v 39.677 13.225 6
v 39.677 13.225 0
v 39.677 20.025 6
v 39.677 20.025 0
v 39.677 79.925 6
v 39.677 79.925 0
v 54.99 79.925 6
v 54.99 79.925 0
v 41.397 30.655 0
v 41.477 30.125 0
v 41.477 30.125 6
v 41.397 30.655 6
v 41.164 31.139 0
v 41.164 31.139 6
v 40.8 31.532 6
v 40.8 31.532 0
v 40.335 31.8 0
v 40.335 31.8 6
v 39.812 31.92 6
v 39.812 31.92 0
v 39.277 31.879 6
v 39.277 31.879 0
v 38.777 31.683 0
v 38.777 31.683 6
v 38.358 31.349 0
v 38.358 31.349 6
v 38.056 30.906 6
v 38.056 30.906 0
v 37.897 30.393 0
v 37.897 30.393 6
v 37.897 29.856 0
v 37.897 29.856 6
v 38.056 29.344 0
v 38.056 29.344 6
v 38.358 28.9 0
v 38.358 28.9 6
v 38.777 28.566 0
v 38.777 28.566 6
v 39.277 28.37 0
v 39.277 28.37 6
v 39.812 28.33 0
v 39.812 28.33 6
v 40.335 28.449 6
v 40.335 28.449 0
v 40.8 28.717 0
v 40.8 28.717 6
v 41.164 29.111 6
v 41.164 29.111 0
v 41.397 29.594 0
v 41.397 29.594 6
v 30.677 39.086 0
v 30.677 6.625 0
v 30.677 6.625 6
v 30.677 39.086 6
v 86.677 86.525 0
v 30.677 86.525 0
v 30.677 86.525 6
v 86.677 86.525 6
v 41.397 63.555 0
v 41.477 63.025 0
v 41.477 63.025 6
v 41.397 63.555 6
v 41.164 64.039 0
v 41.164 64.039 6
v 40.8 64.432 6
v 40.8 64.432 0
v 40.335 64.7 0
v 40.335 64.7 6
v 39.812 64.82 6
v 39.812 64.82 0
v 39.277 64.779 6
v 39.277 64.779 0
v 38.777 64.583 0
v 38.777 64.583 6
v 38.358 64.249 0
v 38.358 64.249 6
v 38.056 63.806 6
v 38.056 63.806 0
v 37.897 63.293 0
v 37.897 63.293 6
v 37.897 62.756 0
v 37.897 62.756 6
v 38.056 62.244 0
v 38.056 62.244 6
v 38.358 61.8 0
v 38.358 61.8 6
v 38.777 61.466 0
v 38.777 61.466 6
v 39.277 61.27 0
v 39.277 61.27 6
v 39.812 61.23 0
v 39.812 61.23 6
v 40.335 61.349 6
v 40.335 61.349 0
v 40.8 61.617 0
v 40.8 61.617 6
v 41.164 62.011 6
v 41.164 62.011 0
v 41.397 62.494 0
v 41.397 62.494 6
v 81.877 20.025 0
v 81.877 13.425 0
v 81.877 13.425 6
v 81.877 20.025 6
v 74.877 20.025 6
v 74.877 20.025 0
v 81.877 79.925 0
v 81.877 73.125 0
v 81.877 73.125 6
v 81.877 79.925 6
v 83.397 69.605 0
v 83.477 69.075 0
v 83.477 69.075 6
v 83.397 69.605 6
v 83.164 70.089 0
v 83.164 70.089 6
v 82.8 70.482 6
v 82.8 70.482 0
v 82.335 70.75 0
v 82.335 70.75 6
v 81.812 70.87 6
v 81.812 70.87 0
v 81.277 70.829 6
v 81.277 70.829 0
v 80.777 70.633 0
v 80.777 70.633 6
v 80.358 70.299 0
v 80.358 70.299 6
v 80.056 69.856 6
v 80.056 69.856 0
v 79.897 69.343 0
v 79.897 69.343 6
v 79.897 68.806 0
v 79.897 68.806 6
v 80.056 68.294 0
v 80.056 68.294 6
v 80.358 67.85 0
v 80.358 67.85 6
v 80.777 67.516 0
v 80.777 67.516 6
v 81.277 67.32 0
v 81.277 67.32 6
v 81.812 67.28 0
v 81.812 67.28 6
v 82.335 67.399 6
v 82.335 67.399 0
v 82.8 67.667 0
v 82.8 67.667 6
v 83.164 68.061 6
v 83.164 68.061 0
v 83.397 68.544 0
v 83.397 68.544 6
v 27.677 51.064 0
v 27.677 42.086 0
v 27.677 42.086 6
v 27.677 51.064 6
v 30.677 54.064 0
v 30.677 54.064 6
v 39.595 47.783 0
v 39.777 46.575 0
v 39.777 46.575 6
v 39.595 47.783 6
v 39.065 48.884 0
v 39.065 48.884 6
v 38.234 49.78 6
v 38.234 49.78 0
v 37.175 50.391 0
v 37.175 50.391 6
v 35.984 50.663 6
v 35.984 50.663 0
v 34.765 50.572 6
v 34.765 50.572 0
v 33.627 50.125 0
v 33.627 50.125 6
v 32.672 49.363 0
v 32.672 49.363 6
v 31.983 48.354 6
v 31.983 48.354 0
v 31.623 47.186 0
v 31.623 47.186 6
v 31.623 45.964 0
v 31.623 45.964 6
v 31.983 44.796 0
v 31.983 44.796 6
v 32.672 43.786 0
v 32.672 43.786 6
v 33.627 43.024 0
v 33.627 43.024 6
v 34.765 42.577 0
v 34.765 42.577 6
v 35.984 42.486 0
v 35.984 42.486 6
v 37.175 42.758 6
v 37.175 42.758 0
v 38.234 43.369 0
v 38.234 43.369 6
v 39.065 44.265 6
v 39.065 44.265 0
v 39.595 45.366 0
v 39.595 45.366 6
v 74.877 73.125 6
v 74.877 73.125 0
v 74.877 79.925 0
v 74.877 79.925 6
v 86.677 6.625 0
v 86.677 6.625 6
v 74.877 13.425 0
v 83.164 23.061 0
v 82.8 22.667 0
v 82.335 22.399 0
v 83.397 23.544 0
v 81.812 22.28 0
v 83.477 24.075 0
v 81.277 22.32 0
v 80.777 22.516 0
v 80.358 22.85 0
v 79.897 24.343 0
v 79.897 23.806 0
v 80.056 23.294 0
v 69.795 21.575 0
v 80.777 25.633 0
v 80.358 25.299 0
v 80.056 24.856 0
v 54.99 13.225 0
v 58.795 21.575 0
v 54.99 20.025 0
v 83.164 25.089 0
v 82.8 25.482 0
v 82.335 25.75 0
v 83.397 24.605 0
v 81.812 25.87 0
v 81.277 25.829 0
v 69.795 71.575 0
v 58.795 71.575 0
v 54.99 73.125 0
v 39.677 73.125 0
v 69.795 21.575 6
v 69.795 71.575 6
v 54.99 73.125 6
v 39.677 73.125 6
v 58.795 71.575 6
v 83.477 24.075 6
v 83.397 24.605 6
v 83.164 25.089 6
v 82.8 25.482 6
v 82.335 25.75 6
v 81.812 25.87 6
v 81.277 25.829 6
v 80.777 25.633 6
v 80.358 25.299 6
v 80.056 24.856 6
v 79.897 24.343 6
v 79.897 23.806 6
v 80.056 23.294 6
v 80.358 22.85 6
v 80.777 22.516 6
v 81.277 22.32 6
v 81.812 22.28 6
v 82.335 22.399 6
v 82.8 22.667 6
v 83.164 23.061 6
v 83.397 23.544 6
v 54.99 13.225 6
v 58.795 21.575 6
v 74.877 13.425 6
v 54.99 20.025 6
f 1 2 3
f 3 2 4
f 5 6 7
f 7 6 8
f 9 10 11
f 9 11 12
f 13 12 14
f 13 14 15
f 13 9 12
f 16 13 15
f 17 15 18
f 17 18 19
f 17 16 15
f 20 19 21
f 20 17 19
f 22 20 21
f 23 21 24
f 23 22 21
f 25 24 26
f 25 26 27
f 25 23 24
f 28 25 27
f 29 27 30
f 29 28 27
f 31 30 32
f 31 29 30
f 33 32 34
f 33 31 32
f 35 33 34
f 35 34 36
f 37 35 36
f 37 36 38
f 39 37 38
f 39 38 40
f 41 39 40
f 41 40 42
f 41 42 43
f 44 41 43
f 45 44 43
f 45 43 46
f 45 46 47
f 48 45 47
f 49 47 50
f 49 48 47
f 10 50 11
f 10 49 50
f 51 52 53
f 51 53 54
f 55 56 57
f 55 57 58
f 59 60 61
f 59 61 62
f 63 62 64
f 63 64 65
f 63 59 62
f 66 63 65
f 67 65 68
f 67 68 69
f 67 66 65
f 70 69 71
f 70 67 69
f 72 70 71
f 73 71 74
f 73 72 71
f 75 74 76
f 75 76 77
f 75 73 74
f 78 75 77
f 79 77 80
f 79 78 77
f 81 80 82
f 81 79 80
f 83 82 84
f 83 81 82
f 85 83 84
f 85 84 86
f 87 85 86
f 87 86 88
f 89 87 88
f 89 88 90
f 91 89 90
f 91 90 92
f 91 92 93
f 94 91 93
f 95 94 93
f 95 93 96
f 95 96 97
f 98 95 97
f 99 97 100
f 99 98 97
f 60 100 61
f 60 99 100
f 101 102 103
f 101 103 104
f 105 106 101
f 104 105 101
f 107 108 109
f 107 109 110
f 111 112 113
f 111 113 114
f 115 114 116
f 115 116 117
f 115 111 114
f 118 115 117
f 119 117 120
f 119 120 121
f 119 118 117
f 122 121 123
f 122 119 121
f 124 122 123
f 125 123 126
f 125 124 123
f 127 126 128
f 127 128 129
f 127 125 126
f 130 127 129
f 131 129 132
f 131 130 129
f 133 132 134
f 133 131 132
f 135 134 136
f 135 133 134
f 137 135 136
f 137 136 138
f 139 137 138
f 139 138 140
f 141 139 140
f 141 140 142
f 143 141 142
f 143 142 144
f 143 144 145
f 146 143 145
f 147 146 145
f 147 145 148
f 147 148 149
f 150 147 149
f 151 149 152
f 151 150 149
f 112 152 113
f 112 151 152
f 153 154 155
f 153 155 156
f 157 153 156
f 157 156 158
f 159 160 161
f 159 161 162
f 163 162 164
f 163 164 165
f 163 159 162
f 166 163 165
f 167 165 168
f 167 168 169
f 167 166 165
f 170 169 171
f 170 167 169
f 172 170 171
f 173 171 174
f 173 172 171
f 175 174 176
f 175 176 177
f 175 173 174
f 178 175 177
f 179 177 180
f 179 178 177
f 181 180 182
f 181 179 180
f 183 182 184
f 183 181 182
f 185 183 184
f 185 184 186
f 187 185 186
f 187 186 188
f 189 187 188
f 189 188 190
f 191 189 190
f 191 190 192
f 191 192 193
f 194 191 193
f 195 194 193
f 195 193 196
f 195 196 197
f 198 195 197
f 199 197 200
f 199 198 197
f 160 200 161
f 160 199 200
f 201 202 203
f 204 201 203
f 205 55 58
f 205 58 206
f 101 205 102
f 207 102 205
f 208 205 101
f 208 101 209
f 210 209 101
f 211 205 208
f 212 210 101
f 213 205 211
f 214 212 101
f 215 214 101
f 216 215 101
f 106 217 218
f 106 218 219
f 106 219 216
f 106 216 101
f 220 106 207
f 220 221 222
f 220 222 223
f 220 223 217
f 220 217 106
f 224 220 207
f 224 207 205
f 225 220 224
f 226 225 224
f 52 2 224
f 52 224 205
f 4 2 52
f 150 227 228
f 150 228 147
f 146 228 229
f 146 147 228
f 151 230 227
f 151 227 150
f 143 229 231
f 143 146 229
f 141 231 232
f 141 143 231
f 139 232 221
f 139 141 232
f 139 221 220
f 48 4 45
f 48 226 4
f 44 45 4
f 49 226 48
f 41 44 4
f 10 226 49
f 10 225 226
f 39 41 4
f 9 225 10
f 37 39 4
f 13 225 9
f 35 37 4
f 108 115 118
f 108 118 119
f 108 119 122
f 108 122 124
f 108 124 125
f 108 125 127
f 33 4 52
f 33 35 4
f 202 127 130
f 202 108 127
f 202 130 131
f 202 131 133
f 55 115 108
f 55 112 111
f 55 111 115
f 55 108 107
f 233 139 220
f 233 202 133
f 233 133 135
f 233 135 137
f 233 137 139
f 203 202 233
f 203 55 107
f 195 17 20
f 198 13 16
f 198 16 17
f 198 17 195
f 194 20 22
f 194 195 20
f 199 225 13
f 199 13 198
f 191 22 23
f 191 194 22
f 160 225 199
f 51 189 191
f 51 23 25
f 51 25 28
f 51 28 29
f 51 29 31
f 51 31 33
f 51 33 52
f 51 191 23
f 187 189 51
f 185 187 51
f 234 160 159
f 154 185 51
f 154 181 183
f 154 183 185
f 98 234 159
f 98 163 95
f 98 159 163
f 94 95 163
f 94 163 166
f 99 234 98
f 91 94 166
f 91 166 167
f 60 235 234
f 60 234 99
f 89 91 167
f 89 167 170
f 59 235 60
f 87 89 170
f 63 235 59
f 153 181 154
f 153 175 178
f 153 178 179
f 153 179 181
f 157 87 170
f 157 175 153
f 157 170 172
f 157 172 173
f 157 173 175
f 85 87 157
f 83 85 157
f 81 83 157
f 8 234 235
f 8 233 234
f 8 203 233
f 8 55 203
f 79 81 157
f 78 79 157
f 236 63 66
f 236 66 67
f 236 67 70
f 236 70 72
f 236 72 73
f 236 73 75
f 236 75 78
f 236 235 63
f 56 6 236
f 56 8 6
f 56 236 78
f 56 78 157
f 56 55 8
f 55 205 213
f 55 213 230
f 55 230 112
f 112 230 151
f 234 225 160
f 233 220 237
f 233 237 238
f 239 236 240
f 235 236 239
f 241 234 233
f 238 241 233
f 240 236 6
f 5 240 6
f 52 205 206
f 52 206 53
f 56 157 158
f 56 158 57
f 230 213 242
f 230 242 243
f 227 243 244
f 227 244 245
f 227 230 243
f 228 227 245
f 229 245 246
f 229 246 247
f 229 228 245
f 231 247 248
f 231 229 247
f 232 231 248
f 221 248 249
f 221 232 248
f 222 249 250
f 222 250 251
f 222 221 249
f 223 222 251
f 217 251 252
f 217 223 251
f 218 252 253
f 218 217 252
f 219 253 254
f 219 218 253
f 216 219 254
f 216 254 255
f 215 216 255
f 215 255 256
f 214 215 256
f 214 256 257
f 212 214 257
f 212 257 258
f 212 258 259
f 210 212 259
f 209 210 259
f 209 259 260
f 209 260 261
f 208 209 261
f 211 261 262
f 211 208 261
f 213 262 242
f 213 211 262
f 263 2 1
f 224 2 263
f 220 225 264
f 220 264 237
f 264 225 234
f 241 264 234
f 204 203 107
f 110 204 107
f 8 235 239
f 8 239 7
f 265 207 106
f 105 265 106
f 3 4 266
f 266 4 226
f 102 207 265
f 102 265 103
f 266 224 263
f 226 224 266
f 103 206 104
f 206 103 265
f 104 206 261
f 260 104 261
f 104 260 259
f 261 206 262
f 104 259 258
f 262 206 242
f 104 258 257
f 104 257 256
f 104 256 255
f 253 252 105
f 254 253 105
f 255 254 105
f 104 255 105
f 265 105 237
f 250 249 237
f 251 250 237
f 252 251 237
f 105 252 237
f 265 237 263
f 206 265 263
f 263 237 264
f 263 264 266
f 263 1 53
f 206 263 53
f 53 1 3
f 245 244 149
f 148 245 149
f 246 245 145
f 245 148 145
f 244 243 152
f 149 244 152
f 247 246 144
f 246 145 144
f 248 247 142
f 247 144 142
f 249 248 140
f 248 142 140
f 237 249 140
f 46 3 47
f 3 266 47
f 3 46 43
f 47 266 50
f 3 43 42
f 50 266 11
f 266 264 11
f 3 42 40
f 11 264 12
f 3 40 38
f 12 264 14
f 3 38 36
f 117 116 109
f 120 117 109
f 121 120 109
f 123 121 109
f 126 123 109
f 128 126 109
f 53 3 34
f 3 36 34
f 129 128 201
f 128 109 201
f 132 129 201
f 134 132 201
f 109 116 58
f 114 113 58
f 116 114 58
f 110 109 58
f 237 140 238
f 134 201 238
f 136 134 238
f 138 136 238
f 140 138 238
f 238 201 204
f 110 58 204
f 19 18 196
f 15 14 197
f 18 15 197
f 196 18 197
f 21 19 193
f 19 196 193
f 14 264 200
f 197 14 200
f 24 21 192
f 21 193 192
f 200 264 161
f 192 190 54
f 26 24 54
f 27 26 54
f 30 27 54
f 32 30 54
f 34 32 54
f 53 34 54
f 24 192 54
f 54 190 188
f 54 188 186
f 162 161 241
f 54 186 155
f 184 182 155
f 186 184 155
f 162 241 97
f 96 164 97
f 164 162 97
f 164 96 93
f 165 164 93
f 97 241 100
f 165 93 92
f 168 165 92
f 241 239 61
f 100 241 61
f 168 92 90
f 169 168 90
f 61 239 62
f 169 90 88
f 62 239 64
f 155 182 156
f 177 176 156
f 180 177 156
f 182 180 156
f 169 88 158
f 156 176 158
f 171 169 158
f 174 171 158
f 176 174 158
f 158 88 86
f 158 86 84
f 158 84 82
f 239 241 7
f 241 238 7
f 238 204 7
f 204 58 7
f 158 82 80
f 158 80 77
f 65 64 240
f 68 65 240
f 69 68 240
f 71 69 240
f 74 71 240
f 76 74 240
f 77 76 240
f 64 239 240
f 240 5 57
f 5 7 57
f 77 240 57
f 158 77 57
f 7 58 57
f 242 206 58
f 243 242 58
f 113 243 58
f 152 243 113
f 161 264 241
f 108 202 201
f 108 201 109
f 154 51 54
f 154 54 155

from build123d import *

# Parameters (mm, degrees)
MODEL_R                  = 1.8
MODEL_R_2                = 4.1
MODEL_W                  = 10.999995004
MODEL_H                  = 49.999979697
MODEL_W_2                = 7
MODEL_H_2                = 6.6
MODEL_W_3                = 15.312275424
MODEL_H_3                = 6.8
RESSALTO_EXTRUS_O1_DEPTH = 6


with BuildPart() as part:
    # Model → Ressalto-extrusão1 (new body)
    with BuildSketch(Plane.XY):
        Polygon((30.677261567, 6.624591957), (30.677261567, 39.085505862), (27.677261567, 42.085505862), (27.677261567, 51.063678051), (30.677261567, 54.063678051), (30.677261567, 86.524591957), (86.677261567, 86.524591957), (86.677261567, 6.624591957), align=None)
        with Locations((81.677261567, 24.074591957)):
            Circle(MODEL_R, mode=Mode.SUBTRACT)
        with Locations((39.677261567, 30.124591957)):
            Circle(MODEL_R, mode=Mode.SUBTRACT)
        with Locations((35.677261567, 46.574591957)):
            Circle(MODEL_R_2, mode=Mode.SUBTRACT)
        with Locations((39.677261567, 63.024591957)):
            Circle(MODEL_R, mode=Mode.SUBTRACT)
        with Locations((81.677261567, 69.074591957)):
            Circle(MODEL_R, mode=Mode.SUBTRACT)
        with Locations((64.294725156, 46.574591957)):
            Rectangle(MODEL_W, MODEL_H, mode=Mode.SUBTRACT)
        with Locations((78.377261567, 16.724591957)):
            Rectangle(MODEL_W_2, MODEL_H_2, mode=Mode.SUBTRACT)
        with Locations((47.333399279, 16.624591957)):
            Rectangle(MODEL_W_3, MODEL_H_3, mode=Mode.SUBTRACT)
        with Locations((47.333399279, 76.524591957)):
            Rectangle(MODEL_W_3, MODEL_H_3, mode=Mode.SUBTRACT)
        with Locations((78.377261567, 76.524591957)):
            Rectangle(MODEL_W_2, MODEL_H_3, mode=Mode.SUBTRACT)
    extrude(amount=RESSALTO_EXTRUS_O1_DEPTH)


solid = part.part
